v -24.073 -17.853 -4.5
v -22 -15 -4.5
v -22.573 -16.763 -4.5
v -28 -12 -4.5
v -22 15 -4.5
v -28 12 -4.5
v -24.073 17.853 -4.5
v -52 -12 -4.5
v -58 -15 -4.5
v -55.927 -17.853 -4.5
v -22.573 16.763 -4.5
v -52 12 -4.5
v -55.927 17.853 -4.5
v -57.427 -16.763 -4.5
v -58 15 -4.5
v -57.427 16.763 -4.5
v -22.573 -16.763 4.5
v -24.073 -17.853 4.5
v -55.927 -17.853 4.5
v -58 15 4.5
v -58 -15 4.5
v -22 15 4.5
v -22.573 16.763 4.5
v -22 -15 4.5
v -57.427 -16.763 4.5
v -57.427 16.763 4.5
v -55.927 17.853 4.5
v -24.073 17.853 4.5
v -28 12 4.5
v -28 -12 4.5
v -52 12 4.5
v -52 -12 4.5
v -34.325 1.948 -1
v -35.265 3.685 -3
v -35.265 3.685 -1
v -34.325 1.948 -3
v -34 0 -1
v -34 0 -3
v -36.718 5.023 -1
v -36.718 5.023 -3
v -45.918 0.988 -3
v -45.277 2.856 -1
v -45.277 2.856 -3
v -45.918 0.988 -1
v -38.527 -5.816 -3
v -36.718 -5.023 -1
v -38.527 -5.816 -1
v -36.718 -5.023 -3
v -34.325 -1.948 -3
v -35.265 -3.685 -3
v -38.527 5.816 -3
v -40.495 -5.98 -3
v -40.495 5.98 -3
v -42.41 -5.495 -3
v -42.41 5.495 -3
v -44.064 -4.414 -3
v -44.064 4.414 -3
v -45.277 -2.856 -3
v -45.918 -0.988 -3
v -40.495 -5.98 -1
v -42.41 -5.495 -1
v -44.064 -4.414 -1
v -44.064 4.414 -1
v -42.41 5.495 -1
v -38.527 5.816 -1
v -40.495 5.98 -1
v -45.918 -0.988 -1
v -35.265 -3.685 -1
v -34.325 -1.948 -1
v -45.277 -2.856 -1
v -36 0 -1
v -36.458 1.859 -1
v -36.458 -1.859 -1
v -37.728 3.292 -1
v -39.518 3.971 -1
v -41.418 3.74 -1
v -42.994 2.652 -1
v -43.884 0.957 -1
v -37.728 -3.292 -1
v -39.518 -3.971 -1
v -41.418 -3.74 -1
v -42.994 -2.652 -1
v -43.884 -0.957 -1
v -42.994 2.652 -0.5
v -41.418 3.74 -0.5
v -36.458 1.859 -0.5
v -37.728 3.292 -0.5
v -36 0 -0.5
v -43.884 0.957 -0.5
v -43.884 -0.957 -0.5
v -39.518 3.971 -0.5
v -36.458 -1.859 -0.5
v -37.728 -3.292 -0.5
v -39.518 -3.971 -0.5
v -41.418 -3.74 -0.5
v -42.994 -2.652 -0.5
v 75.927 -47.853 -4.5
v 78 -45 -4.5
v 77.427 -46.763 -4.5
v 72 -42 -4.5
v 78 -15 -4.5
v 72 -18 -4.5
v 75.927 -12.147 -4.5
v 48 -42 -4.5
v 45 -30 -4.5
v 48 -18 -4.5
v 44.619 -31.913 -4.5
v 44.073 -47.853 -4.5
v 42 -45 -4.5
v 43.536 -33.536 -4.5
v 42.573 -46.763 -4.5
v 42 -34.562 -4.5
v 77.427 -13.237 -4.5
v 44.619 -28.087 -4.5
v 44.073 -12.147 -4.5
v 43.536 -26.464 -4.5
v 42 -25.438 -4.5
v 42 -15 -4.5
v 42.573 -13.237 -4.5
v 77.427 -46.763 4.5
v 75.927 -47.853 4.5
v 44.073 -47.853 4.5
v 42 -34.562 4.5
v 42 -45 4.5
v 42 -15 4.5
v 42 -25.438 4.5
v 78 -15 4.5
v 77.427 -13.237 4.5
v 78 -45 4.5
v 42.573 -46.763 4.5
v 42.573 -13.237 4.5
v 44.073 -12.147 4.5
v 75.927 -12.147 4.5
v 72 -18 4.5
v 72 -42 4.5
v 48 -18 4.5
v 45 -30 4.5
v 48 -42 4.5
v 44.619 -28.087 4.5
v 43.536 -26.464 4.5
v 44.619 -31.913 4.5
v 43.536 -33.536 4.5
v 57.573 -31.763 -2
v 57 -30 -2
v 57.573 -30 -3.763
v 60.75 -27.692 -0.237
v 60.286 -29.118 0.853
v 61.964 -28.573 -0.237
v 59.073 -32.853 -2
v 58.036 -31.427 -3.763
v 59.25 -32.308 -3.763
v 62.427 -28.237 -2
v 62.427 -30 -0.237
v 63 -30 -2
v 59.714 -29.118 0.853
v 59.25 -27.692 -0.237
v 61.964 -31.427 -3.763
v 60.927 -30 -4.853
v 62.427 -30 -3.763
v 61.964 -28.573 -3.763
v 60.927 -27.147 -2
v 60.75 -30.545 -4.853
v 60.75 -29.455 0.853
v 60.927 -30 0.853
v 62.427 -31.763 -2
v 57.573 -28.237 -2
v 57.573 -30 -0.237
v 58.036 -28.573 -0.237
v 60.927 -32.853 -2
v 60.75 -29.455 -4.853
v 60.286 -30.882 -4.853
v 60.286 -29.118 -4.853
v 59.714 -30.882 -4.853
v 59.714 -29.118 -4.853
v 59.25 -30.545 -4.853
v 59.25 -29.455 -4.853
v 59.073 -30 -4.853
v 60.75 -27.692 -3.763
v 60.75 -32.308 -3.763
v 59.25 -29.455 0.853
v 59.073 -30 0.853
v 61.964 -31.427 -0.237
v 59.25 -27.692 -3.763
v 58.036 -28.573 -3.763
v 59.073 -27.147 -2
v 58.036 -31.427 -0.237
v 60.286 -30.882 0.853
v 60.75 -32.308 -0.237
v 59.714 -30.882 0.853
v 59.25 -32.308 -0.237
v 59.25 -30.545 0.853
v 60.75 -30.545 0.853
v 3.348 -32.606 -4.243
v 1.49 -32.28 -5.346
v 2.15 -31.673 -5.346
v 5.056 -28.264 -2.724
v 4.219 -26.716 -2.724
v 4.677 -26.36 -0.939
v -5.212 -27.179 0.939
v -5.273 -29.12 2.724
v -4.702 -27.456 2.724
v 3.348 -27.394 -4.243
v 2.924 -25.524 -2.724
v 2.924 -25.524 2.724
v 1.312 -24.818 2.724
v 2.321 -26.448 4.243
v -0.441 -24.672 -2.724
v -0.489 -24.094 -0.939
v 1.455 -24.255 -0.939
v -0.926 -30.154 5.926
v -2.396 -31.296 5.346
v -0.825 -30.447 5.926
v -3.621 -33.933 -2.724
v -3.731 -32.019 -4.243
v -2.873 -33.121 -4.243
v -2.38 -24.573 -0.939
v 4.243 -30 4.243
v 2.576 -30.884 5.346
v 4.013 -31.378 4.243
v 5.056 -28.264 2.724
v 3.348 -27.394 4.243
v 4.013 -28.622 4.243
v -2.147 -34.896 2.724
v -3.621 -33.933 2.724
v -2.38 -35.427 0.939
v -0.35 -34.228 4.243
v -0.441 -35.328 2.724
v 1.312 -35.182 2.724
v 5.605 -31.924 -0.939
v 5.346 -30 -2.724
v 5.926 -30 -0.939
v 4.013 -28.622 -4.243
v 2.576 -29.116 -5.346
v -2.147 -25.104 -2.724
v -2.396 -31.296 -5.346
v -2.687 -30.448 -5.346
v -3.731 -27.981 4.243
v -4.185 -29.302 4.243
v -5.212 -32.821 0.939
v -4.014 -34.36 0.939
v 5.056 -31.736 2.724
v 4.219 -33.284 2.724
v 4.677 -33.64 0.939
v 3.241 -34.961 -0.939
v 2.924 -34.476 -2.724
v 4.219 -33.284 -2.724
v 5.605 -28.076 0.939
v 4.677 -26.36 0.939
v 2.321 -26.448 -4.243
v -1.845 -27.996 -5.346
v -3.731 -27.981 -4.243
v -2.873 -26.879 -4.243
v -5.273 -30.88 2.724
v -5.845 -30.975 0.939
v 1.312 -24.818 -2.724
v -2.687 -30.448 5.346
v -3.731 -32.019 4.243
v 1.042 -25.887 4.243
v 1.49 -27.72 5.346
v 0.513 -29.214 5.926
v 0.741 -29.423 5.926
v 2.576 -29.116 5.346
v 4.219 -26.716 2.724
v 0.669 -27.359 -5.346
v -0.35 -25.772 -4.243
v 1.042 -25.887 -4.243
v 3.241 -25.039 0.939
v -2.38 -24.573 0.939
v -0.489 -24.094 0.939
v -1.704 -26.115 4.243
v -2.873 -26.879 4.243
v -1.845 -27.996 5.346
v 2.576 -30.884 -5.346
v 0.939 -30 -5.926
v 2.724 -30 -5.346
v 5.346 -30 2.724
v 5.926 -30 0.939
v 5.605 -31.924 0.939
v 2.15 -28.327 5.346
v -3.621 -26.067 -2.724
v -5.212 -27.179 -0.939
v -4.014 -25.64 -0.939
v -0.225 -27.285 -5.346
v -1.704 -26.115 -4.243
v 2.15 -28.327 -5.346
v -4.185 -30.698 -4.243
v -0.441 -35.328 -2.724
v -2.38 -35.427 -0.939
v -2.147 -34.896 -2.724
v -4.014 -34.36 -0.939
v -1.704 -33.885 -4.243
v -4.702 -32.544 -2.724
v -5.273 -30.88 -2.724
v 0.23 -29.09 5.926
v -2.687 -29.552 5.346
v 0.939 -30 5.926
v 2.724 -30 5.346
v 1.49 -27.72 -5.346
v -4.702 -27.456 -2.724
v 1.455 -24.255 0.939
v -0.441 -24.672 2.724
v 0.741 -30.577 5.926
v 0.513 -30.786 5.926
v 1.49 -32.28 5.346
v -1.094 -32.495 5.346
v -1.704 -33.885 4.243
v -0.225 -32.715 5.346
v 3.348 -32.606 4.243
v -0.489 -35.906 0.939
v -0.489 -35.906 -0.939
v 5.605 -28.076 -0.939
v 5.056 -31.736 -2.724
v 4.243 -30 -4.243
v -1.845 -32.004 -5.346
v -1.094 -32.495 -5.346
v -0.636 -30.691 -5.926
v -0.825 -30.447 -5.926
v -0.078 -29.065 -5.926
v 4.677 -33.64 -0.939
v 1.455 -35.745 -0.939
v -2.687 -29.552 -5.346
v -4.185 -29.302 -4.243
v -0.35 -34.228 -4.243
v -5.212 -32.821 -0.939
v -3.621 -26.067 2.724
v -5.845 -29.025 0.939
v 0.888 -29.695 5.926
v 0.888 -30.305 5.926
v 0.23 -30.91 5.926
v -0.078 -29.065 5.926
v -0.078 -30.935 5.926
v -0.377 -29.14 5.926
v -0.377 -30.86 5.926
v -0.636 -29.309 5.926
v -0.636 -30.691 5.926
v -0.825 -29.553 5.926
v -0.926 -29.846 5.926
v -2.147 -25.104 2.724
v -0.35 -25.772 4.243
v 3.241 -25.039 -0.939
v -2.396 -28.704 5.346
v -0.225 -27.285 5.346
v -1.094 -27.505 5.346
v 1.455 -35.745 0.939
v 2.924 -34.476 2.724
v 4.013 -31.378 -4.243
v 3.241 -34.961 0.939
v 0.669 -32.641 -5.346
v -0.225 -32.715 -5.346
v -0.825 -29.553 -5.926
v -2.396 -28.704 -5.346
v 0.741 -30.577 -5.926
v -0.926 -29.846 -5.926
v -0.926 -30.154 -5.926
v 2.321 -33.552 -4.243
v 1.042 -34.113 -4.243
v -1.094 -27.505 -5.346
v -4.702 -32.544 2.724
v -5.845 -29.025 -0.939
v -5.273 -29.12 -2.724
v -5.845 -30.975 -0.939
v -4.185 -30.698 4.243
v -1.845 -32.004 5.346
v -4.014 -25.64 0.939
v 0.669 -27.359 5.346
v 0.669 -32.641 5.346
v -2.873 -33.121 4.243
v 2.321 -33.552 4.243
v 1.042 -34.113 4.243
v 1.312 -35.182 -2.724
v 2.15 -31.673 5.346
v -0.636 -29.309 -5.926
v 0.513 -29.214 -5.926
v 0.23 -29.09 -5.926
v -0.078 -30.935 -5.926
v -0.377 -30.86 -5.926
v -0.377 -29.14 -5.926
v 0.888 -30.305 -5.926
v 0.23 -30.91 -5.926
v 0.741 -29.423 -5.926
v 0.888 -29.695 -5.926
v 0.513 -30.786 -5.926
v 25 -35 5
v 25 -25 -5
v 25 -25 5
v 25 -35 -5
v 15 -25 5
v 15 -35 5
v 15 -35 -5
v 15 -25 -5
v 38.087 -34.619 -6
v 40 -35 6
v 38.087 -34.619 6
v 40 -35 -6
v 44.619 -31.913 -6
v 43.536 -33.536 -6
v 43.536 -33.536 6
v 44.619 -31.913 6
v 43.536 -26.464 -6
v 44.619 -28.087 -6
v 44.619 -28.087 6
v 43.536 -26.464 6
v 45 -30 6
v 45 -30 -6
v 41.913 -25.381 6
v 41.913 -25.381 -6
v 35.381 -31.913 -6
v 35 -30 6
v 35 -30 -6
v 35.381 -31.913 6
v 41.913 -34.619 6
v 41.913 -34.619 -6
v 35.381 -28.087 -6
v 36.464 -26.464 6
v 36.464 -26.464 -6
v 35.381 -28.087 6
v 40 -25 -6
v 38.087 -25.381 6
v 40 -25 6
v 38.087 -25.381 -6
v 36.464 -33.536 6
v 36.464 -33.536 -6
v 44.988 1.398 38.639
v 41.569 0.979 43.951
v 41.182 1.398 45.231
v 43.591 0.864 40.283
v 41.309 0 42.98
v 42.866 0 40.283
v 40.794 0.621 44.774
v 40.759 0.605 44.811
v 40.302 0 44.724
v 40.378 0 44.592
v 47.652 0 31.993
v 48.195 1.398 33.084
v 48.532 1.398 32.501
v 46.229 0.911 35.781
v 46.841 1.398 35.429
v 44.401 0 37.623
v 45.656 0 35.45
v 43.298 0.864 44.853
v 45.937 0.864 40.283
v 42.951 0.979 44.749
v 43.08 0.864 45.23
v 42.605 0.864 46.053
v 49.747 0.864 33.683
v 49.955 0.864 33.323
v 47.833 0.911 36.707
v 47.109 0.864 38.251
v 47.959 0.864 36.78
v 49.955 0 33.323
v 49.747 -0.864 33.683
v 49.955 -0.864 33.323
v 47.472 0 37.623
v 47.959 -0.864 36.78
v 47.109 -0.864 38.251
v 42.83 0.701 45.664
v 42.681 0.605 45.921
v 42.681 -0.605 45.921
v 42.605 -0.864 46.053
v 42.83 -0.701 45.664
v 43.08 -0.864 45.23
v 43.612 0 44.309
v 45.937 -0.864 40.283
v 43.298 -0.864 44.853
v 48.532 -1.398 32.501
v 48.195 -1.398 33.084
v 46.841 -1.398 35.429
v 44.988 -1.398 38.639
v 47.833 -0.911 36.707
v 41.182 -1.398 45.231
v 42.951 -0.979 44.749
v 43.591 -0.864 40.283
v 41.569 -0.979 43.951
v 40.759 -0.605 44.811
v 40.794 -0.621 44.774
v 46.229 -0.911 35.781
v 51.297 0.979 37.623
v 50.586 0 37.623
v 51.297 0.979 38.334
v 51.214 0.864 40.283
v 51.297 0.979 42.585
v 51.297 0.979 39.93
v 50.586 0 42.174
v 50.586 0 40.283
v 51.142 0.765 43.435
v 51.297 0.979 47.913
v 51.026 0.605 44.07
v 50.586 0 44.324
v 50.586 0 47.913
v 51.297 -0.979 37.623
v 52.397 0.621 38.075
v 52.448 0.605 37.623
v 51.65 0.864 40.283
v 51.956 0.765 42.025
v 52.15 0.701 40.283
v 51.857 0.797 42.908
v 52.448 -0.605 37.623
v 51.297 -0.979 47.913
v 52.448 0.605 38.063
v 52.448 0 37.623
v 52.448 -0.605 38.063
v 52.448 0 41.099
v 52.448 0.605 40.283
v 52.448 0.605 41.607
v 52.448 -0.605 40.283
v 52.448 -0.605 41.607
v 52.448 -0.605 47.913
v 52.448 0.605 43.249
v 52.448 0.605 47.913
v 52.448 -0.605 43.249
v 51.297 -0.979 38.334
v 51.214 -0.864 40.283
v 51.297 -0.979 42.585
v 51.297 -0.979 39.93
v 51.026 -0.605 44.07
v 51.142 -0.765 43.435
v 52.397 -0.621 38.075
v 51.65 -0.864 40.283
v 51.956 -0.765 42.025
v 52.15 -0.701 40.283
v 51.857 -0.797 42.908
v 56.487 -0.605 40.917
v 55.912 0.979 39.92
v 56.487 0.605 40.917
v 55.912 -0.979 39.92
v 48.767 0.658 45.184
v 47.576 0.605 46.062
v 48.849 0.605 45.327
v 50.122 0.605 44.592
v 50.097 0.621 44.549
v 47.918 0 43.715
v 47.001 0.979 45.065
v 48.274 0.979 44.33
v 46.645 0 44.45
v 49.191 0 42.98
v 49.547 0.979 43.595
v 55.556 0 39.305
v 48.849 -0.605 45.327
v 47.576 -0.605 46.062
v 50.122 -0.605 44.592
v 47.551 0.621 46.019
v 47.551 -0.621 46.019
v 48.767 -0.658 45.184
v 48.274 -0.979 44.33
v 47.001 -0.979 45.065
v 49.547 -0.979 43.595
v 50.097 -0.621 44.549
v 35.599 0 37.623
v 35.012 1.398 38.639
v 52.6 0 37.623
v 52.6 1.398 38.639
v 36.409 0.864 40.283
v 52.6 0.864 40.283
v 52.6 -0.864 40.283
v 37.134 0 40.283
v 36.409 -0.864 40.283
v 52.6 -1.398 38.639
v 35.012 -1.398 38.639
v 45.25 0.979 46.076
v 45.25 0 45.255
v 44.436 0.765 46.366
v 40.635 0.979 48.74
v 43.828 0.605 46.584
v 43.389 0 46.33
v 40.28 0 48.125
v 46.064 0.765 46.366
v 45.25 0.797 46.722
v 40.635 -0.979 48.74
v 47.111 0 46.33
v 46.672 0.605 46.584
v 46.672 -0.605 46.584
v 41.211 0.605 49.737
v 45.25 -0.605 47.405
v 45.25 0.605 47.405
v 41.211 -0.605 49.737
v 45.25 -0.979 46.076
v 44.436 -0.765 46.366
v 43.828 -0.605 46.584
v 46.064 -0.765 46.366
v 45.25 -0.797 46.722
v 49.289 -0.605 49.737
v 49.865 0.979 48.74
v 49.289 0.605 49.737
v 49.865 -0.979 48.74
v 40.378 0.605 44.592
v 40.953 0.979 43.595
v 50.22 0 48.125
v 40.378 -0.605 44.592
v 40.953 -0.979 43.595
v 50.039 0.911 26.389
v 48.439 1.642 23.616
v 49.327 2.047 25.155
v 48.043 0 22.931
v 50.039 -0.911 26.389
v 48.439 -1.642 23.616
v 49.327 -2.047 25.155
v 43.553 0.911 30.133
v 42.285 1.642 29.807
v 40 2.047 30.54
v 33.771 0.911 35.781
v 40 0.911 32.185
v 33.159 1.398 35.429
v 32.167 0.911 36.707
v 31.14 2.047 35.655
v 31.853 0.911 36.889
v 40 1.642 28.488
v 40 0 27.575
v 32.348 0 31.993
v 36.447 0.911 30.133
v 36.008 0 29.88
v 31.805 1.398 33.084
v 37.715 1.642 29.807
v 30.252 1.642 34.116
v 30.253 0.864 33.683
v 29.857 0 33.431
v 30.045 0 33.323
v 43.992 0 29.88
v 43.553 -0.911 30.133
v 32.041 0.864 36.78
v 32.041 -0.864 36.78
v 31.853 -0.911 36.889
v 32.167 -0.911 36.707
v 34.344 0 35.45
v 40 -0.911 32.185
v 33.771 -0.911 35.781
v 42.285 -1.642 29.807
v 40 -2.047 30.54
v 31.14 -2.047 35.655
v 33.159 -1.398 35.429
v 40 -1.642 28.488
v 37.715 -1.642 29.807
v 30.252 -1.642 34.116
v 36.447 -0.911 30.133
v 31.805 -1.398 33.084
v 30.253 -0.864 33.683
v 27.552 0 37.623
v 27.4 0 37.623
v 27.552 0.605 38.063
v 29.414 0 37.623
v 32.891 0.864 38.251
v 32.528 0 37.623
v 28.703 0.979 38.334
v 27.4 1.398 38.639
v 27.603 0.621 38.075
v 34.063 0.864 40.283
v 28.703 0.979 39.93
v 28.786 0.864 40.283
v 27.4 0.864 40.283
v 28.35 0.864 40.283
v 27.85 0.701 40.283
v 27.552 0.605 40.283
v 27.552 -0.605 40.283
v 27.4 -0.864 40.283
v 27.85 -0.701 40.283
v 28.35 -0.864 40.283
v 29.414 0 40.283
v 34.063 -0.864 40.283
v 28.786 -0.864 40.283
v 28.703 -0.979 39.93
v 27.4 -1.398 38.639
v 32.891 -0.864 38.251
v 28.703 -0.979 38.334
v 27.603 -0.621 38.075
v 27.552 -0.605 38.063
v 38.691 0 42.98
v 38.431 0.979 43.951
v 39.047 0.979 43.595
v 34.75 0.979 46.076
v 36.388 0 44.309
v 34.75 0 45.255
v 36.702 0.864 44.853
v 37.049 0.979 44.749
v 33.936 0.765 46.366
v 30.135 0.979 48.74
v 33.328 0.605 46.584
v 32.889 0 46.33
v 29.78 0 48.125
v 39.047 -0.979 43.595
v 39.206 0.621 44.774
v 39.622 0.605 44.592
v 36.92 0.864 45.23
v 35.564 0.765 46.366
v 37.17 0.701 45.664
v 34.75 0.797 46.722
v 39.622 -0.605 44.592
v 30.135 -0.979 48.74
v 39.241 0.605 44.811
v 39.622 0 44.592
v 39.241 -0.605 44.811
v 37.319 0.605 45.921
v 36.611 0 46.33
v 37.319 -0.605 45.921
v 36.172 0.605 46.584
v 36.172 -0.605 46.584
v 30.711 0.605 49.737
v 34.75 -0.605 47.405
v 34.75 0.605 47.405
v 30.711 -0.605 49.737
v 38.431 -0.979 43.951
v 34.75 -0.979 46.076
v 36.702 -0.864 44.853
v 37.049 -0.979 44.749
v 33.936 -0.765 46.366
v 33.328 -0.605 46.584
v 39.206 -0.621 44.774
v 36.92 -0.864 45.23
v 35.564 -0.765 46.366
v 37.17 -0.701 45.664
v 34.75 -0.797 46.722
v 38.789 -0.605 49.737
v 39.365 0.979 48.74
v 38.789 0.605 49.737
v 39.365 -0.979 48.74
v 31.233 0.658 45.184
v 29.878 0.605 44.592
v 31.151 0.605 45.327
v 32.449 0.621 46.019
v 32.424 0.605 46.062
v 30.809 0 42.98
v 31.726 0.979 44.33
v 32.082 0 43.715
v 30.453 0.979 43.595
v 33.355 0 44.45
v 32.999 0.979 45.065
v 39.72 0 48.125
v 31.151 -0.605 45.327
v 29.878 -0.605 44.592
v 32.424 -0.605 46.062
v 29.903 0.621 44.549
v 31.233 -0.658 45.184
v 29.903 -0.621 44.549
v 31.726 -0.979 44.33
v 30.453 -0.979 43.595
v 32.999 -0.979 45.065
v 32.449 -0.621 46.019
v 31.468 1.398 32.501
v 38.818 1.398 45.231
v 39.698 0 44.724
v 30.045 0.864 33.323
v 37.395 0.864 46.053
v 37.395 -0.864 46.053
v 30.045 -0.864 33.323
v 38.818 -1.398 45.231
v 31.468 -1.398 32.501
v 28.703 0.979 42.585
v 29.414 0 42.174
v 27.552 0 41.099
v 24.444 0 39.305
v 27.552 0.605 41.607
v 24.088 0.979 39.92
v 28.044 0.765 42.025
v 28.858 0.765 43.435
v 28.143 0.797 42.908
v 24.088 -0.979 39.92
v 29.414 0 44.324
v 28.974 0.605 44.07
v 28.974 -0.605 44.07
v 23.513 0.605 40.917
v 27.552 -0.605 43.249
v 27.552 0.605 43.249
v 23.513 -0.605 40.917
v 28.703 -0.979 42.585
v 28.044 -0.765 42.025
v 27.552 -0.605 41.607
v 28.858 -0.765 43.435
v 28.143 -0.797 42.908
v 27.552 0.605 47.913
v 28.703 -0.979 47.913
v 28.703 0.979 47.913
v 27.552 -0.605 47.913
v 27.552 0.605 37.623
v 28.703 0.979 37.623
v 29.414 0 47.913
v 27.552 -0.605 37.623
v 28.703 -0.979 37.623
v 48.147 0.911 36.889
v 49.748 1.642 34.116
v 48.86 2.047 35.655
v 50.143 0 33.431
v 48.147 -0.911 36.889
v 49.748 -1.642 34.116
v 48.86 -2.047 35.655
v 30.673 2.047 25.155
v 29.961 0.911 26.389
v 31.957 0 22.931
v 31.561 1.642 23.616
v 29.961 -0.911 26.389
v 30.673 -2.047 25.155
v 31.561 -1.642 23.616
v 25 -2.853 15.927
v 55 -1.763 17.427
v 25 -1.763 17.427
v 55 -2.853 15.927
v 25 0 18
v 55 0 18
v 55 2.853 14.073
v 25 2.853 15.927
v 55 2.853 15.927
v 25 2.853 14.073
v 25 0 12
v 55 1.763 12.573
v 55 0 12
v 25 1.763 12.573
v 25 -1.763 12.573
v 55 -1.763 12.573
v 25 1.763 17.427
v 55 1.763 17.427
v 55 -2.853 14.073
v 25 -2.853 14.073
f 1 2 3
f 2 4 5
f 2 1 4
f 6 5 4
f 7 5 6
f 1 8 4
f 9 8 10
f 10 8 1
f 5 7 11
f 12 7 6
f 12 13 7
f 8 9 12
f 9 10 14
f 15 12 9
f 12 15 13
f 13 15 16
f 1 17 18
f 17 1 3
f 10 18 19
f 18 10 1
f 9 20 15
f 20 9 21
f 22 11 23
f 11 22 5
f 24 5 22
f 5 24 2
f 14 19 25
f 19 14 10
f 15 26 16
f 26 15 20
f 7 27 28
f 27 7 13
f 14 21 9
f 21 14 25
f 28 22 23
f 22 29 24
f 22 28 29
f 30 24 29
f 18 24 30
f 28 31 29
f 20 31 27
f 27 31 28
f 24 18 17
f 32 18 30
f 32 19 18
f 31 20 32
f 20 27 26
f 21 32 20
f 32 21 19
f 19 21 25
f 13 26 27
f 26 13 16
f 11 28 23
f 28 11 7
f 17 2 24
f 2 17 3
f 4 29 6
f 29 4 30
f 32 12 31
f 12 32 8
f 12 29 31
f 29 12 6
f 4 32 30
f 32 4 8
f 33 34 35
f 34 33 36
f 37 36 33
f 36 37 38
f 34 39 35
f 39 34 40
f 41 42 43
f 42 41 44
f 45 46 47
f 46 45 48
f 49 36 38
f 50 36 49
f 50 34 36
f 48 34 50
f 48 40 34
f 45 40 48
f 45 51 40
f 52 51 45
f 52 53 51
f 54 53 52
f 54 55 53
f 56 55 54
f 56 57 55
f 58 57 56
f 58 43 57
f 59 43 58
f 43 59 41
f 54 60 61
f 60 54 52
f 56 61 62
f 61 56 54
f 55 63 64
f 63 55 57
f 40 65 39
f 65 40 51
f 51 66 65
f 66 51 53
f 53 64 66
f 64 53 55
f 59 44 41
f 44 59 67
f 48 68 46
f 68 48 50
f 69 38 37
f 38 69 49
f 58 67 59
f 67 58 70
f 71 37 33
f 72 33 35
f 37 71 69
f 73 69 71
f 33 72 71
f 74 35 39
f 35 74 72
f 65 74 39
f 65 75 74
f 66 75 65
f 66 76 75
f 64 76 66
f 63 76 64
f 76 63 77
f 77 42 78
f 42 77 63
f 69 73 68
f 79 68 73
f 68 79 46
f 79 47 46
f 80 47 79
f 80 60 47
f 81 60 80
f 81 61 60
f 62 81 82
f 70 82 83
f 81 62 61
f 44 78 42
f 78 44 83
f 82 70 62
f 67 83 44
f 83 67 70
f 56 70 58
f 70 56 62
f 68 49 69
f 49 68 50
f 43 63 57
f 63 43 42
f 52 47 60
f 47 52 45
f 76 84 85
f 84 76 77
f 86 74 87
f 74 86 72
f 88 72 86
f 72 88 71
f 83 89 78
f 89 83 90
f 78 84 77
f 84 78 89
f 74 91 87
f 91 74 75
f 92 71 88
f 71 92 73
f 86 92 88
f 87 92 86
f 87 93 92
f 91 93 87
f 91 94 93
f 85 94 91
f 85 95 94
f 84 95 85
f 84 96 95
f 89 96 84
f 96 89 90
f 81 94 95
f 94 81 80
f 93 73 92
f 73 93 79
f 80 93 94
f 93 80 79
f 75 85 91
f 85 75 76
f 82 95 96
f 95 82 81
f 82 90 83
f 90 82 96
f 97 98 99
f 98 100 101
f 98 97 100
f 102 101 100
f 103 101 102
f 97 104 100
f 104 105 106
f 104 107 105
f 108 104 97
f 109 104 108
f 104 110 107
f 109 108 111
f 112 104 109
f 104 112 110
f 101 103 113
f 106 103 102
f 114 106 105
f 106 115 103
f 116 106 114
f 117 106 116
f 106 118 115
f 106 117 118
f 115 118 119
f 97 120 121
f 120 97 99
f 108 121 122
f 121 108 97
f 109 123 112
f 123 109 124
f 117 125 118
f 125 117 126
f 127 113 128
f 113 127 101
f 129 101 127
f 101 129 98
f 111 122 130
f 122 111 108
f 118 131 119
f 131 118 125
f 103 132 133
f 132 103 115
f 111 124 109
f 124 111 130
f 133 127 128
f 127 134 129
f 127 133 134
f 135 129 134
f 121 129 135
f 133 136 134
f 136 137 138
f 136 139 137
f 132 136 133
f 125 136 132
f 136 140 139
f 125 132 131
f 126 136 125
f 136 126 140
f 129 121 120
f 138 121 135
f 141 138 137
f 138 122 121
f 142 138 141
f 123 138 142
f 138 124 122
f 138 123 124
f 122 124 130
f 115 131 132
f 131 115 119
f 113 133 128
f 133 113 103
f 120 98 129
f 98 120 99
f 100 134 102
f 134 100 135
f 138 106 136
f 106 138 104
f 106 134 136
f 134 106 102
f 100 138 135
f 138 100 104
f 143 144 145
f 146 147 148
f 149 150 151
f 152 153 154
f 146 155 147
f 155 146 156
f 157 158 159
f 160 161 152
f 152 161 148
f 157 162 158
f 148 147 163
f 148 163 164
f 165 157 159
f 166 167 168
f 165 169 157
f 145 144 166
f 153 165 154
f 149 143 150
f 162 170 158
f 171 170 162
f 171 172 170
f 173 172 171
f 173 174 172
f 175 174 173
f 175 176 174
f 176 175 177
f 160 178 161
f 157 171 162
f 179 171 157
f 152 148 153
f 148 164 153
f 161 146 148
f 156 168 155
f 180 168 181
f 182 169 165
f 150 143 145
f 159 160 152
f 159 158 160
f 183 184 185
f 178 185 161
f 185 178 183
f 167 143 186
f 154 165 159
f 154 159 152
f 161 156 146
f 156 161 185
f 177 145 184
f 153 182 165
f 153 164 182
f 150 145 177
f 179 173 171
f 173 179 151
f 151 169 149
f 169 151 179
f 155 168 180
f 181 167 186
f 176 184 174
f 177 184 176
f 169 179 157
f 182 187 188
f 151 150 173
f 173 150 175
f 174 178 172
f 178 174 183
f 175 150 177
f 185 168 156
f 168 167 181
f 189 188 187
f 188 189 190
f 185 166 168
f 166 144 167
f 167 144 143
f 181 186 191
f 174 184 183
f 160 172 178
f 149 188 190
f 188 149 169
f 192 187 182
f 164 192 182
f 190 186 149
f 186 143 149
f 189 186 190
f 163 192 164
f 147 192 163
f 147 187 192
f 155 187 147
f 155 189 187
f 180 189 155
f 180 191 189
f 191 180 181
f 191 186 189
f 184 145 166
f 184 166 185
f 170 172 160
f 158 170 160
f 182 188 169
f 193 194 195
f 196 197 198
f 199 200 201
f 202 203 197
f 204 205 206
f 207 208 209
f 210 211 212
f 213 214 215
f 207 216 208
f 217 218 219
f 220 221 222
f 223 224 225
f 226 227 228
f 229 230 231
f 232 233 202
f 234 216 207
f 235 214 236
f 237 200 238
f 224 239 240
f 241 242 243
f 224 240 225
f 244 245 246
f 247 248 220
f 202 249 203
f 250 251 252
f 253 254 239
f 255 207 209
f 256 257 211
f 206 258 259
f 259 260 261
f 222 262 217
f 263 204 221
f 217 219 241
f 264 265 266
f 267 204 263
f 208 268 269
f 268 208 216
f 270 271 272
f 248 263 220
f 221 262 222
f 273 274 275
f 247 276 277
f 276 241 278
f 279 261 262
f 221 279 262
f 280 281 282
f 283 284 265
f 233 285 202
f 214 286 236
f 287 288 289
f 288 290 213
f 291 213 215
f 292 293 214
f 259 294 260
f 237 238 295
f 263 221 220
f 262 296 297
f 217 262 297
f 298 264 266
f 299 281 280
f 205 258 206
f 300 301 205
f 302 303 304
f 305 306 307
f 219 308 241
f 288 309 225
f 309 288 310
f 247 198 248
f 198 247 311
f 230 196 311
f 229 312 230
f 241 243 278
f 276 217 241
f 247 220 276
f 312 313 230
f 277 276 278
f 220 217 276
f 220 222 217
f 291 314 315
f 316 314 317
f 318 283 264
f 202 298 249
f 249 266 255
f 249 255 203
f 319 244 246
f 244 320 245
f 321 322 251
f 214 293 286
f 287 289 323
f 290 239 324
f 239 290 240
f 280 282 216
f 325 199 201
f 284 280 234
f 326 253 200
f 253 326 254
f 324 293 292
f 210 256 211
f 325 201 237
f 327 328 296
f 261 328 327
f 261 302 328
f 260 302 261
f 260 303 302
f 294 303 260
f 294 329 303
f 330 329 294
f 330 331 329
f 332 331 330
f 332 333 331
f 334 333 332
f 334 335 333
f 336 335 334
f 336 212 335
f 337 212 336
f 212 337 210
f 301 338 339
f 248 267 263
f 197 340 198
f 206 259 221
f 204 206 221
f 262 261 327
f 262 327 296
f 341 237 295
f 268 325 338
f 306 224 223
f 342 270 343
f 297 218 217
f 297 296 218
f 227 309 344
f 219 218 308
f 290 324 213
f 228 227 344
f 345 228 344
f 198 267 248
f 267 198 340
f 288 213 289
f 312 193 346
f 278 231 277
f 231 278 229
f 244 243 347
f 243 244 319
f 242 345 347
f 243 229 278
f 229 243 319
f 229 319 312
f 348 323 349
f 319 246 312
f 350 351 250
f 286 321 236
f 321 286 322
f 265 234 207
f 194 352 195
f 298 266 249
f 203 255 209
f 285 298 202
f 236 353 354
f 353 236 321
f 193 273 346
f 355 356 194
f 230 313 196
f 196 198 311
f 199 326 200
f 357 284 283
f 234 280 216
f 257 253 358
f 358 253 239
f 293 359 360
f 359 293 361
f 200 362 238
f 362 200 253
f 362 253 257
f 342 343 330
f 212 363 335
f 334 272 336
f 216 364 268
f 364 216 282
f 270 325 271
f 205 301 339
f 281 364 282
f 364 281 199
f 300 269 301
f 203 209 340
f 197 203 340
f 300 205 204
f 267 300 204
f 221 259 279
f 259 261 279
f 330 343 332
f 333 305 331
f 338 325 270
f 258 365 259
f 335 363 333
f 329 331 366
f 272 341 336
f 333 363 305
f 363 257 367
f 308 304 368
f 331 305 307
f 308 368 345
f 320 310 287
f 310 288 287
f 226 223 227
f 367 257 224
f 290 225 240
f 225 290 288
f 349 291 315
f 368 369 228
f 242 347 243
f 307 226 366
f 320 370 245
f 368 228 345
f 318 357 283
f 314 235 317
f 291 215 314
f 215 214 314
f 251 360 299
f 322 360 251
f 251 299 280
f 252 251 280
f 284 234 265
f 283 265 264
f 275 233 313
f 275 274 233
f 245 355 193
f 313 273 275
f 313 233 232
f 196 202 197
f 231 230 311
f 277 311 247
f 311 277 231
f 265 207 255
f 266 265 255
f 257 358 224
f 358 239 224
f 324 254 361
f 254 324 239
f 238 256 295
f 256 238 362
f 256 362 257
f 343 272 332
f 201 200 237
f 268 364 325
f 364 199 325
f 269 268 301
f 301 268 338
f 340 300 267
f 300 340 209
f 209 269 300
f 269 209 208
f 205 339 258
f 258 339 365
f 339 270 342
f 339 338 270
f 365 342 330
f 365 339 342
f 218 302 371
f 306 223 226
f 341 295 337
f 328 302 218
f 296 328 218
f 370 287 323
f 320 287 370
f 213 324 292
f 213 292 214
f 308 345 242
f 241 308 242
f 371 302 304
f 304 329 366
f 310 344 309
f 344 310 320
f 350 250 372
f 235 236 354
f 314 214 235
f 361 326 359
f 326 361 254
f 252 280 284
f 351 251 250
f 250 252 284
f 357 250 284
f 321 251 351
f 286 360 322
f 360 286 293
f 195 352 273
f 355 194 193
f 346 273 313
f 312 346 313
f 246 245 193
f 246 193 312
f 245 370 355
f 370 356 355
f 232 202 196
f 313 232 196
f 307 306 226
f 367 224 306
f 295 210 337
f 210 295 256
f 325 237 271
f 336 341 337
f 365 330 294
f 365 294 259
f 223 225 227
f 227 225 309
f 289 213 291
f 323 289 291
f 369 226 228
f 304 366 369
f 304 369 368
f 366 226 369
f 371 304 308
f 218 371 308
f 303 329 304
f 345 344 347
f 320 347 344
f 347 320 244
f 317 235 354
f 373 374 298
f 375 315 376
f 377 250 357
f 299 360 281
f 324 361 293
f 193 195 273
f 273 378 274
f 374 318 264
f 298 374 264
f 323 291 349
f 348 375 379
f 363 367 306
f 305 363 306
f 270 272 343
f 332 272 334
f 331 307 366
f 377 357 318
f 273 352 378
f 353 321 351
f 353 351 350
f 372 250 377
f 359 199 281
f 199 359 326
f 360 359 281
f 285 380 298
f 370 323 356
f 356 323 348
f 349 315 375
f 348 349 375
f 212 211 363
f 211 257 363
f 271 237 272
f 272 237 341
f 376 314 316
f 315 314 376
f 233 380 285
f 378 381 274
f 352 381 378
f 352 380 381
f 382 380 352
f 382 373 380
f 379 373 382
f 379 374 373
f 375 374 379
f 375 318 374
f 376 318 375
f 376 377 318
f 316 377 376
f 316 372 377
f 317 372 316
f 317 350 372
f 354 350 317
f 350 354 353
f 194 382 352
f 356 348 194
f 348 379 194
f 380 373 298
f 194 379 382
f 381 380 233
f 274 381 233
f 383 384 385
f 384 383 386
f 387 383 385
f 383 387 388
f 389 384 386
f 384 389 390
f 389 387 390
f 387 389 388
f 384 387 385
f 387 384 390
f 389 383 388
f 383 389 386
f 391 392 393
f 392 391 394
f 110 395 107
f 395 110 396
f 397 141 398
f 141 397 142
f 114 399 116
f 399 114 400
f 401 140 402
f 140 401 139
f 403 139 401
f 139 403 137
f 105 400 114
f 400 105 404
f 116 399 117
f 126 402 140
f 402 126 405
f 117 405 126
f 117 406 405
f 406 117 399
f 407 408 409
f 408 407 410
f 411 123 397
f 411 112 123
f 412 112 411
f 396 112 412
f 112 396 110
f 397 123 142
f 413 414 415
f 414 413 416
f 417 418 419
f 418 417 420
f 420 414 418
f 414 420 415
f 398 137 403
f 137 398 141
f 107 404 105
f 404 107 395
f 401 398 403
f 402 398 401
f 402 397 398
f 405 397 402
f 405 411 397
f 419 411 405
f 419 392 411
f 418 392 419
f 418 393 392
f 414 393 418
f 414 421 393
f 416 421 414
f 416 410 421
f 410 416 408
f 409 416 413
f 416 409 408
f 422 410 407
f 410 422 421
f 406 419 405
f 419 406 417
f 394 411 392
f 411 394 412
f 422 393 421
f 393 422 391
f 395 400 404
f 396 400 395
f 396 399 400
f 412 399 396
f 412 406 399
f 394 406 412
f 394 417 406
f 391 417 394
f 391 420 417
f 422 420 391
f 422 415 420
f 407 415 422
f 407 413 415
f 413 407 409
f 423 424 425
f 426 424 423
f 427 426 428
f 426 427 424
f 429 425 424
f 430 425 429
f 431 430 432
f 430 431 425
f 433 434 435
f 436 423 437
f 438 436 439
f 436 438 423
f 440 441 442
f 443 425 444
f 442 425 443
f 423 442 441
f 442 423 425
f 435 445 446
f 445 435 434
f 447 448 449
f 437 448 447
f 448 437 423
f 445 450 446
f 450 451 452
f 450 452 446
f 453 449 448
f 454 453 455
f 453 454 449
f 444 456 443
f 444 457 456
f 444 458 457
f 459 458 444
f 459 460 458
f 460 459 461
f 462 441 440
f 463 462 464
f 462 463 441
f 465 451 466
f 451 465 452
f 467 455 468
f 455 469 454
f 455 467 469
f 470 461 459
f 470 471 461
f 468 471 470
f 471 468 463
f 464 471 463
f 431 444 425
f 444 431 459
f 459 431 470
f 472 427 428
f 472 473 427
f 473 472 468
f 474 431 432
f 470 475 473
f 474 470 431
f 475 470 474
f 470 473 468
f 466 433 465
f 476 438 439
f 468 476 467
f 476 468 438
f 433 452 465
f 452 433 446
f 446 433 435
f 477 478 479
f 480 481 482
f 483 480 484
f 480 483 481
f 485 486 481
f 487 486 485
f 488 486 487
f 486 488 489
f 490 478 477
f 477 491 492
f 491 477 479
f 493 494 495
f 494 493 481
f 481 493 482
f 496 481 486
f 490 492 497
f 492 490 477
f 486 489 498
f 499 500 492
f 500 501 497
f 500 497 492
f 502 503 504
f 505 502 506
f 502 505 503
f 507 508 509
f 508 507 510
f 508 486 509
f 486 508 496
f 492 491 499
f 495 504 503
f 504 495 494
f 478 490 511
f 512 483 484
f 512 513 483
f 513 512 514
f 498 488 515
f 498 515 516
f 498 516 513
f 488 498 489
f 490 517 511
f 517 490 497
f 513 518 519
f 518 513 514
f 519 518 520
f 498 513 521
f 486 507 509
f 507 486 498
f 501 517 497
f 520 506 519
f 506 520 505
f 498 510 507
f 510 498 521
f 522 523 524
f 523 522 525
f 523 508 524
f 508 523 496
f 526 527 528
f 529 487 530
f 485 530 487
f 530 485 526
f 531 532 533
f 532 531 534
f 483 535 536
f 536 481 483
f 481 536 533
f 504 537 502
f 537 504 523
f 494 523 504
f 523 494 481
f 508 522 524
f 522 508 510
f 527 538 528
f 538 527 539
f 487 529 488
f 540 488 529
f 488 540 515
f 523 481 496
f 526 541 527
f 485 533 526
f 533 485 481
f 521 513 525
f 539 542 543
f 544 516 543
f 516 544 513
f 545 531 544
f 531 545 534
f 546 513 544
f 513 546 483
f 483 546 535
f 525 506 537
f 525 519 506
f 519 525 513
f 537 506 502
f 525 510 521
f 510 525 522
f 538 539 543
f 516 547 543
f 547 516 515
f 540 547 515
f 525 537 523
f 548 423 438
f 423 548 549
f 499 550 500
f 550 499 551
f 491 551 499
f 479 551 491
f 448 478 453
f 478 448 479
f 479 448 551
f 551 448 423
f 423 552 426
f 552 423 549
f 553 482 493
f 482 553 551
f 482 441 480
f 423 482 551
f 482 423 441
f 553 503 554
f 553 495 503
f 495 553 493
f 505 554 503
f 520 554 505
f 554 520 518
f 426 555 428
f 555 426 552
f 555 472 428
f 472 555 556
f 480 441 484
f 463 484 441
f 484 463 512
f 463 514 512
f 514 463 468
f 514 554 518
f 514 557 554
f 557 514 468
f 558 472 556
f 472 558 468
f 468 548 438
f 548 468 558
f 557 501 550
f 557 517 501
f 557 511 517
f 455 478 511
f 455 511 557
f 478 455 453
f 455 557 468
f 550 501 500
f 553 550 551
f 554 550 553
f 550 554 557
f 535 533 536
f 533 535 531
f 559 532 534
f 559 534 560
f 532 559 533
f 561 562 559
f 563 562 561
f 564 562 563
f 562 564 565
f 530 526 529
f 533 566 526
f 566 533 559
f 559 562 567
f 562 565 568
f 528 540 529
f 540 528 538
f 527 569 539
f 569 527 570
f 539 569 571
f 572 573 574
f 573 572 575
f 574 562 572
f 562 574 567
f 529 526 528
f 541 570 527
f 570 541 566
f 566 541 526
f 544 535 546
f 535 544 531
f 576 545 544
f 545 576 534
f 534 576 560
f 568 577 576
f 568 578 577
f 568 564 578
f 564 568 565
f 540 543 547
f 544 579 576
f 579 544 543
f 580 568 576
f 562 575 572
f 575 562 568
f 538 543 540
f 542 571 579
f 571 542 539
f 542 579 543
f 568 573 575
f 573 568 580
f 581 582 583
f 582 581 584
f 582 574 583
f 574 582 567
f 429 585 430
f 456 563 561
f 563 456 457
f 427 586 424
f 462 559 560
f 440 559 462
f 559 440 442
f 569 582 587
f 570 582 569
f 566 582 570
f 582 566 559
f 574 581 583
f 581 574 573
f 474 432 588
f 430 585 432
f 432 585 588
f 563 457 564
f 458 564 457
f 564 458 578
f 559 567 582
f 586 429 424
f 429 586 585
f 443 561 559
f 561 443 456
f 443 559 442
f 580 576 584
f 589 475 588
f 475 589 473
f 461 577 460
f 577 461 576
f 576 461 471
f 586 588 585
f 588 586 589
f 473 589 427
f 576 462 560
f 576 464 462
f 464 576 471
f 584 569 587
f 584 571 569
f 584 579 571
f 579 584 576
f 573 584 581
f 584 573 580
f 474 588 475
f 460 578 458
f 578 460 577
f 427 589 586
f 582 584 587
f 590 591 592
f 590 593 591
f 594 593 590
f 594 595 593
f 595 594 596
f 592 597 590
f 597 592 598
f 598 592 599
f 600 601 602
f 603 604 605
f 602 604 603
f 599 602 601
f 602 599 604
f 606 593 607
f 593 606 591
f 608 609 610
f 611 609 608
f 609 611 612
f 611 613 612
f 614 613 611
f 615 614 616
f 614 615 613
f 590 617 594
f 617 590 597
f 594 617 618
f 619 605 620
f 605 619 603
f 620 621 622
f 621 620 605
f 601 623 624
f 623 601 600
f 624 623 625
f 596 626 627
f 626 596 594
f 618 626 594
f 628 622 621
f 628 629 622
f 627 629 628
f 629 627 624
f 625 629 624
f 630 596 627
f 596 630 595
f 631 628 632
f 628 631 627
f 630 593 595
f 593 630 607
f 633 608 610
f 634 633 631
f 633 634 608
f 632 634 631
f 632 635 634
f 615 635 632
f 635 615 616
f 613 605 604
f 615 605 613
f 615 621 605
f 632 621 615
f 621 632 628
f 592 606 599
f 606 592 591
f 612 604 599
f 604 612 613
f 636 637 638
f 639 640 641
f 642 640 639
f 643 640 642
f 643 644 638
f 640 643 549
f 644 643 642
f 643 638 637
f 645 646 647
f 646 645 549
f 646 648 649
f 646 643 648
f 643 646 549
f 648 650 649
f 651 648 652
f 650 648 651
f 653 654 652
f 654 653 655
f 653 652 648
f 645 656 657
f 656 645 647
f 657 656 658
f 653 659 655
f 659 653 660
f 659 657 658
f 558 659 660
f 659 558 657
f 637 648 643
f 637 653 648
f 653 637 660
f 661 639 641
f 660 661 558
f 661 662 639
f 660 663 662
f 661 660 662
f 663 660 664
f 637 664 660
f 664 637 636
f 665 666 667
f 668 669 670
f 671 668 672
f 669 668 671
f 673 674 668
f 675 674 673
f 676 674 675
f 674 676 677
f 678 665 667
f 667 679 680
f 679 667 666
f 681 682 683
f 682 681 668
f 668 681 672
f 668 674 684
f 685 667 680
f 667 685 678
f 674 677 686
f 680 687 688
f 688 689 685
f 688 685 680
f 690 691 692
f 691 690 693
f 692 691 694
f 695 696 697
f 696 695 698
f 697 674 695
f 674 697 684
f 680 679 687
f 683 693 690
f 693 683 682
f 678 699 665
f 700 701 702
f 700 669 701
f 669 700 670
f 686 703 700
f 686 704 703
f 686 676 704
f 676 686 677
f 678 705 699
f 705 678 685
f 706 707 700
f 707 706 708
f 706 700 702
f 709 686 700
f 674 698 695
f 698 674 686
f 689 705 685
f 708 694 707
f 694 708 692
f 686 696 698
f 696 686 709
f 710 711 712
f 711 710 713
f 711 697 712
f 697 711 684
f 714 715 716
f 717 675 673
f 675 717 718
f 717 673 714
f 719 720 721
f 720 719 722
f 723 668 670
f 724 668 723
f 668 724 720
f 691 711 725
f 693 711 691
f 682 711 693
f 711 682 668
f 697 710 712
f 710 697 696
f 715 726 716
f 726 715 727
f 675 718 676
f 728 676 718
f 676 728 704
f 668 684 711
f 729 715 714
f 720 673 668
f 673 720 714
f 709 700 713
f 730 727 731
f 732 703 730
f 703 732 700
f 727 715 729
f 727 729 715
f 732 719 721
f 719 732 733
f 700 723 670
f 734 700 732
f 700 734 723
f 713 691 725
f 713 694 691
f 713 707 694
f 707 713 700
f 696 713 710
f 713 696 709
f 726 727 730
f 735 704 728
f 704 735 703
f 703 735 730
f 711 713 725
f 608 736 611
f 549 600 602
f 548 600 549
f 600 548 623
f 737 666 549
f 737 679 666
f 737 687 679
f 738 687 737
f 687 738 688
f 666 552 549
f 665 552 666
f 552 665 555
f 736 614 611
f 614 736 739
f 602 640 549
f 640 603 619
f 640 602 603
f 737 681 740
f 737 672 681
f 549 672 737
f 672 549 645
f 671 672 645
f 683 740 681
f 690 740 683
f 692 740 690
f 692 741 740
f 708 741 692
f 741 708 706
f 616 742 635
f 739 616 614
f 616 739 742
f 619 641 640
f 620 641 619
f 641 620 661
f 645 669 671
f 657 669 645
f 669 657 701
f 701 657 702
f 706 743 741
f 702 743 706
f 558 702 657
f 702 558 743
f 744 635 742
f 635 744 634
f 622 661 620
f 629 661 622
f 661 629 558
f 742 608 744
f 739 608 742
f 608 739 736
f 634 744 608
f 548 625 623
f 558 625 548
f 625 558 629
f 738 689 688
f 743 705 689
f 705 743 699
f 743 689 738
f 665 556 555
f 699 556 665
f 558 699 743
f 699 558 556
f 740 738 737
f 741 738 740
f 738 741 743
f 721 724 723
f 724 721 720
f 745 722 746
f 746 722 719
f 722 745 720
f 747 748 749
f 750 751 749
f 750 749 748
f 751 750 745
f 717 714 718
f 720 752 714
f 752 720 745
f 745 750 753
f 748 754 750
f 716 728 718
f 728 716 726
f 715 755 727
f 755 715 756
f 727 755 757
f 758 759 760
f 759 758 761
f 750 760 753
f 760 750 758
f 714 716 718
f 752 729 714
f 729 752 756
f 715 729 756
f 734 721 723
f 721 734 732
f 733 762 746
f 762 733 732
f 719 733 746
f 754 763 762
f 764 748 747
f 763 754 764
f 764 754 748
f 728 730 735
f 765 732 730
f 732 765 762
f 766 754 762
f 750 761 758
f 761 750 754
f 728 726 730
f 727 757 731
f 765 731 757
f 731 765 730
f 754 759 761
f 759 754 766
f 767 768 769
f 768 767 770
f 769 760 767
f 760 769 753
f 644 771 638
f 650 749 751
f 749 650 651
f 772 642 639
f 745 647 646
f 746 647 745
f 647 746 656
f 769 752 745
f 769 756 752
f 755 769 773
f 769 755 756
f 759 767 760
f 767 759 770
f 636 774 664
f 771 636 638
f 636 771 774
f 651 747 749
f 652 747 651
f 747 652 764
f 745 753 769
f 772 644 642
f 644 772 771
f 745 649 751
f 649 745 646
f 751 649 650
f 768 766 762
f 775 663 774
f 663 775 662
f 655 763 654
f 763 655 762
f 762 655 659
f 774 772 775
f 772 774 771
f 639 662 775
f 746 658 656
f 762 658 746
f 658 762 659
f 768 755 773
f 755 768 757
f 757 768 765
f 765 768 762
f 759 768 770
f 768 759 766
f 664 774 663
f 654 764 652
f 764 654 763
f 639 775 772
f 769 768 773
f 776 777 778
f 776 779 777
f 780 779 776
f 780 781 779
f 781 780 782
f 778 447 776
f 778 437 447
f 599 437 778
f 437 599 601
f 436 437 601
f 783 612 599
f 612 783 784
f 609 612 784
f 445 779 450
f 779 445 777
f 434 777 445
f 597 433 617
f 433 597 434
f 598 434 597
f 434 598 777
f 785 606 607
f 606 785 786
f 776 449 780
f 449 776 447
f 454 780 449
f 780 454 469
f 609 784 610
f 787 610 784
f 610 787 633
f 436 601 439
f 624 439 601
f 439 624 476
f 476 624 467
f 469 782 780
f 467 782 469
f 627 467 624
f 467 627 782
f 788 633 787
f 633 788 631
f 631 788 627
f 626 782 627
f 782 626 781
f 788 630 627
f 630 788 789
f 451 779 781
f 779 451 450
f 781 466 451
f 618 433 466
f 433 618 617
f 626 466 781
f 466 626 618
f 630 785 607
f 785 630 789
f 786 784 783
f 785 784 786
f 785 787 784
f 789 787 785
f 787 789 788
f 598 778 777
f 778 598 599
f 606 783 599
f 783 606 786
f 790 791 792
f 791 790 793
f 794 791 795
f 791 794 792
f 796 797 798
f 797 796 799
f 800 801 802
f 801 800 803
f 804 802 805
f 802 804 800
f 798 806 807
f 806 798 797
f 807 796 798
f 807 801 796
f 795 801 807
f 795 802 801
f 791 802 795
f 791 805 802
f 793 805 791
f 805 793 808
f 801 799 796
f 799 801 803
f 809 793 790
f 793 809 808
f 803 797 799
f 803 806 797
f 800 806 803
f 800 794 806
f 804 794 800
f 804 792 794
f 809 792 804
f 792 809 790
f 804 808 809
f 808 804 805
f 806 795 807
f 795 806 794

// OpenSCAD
// tutorial/basic/09_children_and_recursion.scad
// ==============================================
// 学习目标: 掌握 children() 子节点传递和递归建模
// children() 让你把子对象作为参数传给 module
// 递归 让你用简洁代码创建复杂分形结构

// ---- children() 基础 ----
module container() {
    difference() {
        // 外壳
        minkowski() {
            cube([30, 30, 8], center = true);
            cylinder(r = 3, h = 1, center = true);
        }

        // 掏空
        cube([24, 24, 10], center = true);

        // 底部开口
        translate([0, 0, -4]) cube([10, 24, 3], center = true);
    }

    // 在容器内放置任意子对象
    translate([0, 0, -2]) children();
}

module badge() {
    cylinder(r = 6, h = 2, center = true);
    translate([0, 0, 1]) cylinder(r = 4, h = 1, center = true);
}

// 容器内放徽章
translate([-40, 0, 0])
    container() {
        badge();
    }

// ---- children 索引 ----
module row(spacing) {
    // children(0) 的子对象按间距排列
    for (i = [0 : $children - 1]) {
        translate([i * spacing, 0, 0])
            children(i);
    }
}

translate([0, -30, 0])
    row(spacing = 20) {
        sphere(r = 6);
        cube([10, 10, 10], center = true);
        cylinder(r = 5, h = 12, center = true);
        // 嵌套 children!
        container() {
            sphere(r = 3);
        }
    }

// ---- 递归: 分形树 ----
module fractal_tree(depth, length, angle) {
    if (depth > 0) {
        // 树干
        rotate([0, 90, 0])
            cylinder(r = length / 10, h = length, center = true);

        // 左分支
        translate([0, 0, length / 2])
            rotate([0, angle, 0]) {
                fractal_tree(depth - 1, length * 0.7, angle);
            }

        // 右分支
        translate([0, 0, length / 2])
            rotate([0, -angle, 0]) {
                fractal_tree(depth - 1, length * 0.7, angle);
            }
    }
}

translate([40, 0, 15])
    fractal_tree(depth = 4, length = 30, angle = 30);

// ---- 递归: 希尔伯特曲线 (2D) ----
module hilbert(level, step) {
    if (level == 0) {
        // 什么都不做
    } else {
        rotate([0, 0, -90])
            hilbert(level - 1, step);
        translate([0, step, 0])
            children();
        rotate([0, 0, 90]) {
            translate([step, 0, 0])
                children();
            translate([0, step, 0]) {
                children();
                hilbert(level - 1, step);
            }
        }
    }
}
